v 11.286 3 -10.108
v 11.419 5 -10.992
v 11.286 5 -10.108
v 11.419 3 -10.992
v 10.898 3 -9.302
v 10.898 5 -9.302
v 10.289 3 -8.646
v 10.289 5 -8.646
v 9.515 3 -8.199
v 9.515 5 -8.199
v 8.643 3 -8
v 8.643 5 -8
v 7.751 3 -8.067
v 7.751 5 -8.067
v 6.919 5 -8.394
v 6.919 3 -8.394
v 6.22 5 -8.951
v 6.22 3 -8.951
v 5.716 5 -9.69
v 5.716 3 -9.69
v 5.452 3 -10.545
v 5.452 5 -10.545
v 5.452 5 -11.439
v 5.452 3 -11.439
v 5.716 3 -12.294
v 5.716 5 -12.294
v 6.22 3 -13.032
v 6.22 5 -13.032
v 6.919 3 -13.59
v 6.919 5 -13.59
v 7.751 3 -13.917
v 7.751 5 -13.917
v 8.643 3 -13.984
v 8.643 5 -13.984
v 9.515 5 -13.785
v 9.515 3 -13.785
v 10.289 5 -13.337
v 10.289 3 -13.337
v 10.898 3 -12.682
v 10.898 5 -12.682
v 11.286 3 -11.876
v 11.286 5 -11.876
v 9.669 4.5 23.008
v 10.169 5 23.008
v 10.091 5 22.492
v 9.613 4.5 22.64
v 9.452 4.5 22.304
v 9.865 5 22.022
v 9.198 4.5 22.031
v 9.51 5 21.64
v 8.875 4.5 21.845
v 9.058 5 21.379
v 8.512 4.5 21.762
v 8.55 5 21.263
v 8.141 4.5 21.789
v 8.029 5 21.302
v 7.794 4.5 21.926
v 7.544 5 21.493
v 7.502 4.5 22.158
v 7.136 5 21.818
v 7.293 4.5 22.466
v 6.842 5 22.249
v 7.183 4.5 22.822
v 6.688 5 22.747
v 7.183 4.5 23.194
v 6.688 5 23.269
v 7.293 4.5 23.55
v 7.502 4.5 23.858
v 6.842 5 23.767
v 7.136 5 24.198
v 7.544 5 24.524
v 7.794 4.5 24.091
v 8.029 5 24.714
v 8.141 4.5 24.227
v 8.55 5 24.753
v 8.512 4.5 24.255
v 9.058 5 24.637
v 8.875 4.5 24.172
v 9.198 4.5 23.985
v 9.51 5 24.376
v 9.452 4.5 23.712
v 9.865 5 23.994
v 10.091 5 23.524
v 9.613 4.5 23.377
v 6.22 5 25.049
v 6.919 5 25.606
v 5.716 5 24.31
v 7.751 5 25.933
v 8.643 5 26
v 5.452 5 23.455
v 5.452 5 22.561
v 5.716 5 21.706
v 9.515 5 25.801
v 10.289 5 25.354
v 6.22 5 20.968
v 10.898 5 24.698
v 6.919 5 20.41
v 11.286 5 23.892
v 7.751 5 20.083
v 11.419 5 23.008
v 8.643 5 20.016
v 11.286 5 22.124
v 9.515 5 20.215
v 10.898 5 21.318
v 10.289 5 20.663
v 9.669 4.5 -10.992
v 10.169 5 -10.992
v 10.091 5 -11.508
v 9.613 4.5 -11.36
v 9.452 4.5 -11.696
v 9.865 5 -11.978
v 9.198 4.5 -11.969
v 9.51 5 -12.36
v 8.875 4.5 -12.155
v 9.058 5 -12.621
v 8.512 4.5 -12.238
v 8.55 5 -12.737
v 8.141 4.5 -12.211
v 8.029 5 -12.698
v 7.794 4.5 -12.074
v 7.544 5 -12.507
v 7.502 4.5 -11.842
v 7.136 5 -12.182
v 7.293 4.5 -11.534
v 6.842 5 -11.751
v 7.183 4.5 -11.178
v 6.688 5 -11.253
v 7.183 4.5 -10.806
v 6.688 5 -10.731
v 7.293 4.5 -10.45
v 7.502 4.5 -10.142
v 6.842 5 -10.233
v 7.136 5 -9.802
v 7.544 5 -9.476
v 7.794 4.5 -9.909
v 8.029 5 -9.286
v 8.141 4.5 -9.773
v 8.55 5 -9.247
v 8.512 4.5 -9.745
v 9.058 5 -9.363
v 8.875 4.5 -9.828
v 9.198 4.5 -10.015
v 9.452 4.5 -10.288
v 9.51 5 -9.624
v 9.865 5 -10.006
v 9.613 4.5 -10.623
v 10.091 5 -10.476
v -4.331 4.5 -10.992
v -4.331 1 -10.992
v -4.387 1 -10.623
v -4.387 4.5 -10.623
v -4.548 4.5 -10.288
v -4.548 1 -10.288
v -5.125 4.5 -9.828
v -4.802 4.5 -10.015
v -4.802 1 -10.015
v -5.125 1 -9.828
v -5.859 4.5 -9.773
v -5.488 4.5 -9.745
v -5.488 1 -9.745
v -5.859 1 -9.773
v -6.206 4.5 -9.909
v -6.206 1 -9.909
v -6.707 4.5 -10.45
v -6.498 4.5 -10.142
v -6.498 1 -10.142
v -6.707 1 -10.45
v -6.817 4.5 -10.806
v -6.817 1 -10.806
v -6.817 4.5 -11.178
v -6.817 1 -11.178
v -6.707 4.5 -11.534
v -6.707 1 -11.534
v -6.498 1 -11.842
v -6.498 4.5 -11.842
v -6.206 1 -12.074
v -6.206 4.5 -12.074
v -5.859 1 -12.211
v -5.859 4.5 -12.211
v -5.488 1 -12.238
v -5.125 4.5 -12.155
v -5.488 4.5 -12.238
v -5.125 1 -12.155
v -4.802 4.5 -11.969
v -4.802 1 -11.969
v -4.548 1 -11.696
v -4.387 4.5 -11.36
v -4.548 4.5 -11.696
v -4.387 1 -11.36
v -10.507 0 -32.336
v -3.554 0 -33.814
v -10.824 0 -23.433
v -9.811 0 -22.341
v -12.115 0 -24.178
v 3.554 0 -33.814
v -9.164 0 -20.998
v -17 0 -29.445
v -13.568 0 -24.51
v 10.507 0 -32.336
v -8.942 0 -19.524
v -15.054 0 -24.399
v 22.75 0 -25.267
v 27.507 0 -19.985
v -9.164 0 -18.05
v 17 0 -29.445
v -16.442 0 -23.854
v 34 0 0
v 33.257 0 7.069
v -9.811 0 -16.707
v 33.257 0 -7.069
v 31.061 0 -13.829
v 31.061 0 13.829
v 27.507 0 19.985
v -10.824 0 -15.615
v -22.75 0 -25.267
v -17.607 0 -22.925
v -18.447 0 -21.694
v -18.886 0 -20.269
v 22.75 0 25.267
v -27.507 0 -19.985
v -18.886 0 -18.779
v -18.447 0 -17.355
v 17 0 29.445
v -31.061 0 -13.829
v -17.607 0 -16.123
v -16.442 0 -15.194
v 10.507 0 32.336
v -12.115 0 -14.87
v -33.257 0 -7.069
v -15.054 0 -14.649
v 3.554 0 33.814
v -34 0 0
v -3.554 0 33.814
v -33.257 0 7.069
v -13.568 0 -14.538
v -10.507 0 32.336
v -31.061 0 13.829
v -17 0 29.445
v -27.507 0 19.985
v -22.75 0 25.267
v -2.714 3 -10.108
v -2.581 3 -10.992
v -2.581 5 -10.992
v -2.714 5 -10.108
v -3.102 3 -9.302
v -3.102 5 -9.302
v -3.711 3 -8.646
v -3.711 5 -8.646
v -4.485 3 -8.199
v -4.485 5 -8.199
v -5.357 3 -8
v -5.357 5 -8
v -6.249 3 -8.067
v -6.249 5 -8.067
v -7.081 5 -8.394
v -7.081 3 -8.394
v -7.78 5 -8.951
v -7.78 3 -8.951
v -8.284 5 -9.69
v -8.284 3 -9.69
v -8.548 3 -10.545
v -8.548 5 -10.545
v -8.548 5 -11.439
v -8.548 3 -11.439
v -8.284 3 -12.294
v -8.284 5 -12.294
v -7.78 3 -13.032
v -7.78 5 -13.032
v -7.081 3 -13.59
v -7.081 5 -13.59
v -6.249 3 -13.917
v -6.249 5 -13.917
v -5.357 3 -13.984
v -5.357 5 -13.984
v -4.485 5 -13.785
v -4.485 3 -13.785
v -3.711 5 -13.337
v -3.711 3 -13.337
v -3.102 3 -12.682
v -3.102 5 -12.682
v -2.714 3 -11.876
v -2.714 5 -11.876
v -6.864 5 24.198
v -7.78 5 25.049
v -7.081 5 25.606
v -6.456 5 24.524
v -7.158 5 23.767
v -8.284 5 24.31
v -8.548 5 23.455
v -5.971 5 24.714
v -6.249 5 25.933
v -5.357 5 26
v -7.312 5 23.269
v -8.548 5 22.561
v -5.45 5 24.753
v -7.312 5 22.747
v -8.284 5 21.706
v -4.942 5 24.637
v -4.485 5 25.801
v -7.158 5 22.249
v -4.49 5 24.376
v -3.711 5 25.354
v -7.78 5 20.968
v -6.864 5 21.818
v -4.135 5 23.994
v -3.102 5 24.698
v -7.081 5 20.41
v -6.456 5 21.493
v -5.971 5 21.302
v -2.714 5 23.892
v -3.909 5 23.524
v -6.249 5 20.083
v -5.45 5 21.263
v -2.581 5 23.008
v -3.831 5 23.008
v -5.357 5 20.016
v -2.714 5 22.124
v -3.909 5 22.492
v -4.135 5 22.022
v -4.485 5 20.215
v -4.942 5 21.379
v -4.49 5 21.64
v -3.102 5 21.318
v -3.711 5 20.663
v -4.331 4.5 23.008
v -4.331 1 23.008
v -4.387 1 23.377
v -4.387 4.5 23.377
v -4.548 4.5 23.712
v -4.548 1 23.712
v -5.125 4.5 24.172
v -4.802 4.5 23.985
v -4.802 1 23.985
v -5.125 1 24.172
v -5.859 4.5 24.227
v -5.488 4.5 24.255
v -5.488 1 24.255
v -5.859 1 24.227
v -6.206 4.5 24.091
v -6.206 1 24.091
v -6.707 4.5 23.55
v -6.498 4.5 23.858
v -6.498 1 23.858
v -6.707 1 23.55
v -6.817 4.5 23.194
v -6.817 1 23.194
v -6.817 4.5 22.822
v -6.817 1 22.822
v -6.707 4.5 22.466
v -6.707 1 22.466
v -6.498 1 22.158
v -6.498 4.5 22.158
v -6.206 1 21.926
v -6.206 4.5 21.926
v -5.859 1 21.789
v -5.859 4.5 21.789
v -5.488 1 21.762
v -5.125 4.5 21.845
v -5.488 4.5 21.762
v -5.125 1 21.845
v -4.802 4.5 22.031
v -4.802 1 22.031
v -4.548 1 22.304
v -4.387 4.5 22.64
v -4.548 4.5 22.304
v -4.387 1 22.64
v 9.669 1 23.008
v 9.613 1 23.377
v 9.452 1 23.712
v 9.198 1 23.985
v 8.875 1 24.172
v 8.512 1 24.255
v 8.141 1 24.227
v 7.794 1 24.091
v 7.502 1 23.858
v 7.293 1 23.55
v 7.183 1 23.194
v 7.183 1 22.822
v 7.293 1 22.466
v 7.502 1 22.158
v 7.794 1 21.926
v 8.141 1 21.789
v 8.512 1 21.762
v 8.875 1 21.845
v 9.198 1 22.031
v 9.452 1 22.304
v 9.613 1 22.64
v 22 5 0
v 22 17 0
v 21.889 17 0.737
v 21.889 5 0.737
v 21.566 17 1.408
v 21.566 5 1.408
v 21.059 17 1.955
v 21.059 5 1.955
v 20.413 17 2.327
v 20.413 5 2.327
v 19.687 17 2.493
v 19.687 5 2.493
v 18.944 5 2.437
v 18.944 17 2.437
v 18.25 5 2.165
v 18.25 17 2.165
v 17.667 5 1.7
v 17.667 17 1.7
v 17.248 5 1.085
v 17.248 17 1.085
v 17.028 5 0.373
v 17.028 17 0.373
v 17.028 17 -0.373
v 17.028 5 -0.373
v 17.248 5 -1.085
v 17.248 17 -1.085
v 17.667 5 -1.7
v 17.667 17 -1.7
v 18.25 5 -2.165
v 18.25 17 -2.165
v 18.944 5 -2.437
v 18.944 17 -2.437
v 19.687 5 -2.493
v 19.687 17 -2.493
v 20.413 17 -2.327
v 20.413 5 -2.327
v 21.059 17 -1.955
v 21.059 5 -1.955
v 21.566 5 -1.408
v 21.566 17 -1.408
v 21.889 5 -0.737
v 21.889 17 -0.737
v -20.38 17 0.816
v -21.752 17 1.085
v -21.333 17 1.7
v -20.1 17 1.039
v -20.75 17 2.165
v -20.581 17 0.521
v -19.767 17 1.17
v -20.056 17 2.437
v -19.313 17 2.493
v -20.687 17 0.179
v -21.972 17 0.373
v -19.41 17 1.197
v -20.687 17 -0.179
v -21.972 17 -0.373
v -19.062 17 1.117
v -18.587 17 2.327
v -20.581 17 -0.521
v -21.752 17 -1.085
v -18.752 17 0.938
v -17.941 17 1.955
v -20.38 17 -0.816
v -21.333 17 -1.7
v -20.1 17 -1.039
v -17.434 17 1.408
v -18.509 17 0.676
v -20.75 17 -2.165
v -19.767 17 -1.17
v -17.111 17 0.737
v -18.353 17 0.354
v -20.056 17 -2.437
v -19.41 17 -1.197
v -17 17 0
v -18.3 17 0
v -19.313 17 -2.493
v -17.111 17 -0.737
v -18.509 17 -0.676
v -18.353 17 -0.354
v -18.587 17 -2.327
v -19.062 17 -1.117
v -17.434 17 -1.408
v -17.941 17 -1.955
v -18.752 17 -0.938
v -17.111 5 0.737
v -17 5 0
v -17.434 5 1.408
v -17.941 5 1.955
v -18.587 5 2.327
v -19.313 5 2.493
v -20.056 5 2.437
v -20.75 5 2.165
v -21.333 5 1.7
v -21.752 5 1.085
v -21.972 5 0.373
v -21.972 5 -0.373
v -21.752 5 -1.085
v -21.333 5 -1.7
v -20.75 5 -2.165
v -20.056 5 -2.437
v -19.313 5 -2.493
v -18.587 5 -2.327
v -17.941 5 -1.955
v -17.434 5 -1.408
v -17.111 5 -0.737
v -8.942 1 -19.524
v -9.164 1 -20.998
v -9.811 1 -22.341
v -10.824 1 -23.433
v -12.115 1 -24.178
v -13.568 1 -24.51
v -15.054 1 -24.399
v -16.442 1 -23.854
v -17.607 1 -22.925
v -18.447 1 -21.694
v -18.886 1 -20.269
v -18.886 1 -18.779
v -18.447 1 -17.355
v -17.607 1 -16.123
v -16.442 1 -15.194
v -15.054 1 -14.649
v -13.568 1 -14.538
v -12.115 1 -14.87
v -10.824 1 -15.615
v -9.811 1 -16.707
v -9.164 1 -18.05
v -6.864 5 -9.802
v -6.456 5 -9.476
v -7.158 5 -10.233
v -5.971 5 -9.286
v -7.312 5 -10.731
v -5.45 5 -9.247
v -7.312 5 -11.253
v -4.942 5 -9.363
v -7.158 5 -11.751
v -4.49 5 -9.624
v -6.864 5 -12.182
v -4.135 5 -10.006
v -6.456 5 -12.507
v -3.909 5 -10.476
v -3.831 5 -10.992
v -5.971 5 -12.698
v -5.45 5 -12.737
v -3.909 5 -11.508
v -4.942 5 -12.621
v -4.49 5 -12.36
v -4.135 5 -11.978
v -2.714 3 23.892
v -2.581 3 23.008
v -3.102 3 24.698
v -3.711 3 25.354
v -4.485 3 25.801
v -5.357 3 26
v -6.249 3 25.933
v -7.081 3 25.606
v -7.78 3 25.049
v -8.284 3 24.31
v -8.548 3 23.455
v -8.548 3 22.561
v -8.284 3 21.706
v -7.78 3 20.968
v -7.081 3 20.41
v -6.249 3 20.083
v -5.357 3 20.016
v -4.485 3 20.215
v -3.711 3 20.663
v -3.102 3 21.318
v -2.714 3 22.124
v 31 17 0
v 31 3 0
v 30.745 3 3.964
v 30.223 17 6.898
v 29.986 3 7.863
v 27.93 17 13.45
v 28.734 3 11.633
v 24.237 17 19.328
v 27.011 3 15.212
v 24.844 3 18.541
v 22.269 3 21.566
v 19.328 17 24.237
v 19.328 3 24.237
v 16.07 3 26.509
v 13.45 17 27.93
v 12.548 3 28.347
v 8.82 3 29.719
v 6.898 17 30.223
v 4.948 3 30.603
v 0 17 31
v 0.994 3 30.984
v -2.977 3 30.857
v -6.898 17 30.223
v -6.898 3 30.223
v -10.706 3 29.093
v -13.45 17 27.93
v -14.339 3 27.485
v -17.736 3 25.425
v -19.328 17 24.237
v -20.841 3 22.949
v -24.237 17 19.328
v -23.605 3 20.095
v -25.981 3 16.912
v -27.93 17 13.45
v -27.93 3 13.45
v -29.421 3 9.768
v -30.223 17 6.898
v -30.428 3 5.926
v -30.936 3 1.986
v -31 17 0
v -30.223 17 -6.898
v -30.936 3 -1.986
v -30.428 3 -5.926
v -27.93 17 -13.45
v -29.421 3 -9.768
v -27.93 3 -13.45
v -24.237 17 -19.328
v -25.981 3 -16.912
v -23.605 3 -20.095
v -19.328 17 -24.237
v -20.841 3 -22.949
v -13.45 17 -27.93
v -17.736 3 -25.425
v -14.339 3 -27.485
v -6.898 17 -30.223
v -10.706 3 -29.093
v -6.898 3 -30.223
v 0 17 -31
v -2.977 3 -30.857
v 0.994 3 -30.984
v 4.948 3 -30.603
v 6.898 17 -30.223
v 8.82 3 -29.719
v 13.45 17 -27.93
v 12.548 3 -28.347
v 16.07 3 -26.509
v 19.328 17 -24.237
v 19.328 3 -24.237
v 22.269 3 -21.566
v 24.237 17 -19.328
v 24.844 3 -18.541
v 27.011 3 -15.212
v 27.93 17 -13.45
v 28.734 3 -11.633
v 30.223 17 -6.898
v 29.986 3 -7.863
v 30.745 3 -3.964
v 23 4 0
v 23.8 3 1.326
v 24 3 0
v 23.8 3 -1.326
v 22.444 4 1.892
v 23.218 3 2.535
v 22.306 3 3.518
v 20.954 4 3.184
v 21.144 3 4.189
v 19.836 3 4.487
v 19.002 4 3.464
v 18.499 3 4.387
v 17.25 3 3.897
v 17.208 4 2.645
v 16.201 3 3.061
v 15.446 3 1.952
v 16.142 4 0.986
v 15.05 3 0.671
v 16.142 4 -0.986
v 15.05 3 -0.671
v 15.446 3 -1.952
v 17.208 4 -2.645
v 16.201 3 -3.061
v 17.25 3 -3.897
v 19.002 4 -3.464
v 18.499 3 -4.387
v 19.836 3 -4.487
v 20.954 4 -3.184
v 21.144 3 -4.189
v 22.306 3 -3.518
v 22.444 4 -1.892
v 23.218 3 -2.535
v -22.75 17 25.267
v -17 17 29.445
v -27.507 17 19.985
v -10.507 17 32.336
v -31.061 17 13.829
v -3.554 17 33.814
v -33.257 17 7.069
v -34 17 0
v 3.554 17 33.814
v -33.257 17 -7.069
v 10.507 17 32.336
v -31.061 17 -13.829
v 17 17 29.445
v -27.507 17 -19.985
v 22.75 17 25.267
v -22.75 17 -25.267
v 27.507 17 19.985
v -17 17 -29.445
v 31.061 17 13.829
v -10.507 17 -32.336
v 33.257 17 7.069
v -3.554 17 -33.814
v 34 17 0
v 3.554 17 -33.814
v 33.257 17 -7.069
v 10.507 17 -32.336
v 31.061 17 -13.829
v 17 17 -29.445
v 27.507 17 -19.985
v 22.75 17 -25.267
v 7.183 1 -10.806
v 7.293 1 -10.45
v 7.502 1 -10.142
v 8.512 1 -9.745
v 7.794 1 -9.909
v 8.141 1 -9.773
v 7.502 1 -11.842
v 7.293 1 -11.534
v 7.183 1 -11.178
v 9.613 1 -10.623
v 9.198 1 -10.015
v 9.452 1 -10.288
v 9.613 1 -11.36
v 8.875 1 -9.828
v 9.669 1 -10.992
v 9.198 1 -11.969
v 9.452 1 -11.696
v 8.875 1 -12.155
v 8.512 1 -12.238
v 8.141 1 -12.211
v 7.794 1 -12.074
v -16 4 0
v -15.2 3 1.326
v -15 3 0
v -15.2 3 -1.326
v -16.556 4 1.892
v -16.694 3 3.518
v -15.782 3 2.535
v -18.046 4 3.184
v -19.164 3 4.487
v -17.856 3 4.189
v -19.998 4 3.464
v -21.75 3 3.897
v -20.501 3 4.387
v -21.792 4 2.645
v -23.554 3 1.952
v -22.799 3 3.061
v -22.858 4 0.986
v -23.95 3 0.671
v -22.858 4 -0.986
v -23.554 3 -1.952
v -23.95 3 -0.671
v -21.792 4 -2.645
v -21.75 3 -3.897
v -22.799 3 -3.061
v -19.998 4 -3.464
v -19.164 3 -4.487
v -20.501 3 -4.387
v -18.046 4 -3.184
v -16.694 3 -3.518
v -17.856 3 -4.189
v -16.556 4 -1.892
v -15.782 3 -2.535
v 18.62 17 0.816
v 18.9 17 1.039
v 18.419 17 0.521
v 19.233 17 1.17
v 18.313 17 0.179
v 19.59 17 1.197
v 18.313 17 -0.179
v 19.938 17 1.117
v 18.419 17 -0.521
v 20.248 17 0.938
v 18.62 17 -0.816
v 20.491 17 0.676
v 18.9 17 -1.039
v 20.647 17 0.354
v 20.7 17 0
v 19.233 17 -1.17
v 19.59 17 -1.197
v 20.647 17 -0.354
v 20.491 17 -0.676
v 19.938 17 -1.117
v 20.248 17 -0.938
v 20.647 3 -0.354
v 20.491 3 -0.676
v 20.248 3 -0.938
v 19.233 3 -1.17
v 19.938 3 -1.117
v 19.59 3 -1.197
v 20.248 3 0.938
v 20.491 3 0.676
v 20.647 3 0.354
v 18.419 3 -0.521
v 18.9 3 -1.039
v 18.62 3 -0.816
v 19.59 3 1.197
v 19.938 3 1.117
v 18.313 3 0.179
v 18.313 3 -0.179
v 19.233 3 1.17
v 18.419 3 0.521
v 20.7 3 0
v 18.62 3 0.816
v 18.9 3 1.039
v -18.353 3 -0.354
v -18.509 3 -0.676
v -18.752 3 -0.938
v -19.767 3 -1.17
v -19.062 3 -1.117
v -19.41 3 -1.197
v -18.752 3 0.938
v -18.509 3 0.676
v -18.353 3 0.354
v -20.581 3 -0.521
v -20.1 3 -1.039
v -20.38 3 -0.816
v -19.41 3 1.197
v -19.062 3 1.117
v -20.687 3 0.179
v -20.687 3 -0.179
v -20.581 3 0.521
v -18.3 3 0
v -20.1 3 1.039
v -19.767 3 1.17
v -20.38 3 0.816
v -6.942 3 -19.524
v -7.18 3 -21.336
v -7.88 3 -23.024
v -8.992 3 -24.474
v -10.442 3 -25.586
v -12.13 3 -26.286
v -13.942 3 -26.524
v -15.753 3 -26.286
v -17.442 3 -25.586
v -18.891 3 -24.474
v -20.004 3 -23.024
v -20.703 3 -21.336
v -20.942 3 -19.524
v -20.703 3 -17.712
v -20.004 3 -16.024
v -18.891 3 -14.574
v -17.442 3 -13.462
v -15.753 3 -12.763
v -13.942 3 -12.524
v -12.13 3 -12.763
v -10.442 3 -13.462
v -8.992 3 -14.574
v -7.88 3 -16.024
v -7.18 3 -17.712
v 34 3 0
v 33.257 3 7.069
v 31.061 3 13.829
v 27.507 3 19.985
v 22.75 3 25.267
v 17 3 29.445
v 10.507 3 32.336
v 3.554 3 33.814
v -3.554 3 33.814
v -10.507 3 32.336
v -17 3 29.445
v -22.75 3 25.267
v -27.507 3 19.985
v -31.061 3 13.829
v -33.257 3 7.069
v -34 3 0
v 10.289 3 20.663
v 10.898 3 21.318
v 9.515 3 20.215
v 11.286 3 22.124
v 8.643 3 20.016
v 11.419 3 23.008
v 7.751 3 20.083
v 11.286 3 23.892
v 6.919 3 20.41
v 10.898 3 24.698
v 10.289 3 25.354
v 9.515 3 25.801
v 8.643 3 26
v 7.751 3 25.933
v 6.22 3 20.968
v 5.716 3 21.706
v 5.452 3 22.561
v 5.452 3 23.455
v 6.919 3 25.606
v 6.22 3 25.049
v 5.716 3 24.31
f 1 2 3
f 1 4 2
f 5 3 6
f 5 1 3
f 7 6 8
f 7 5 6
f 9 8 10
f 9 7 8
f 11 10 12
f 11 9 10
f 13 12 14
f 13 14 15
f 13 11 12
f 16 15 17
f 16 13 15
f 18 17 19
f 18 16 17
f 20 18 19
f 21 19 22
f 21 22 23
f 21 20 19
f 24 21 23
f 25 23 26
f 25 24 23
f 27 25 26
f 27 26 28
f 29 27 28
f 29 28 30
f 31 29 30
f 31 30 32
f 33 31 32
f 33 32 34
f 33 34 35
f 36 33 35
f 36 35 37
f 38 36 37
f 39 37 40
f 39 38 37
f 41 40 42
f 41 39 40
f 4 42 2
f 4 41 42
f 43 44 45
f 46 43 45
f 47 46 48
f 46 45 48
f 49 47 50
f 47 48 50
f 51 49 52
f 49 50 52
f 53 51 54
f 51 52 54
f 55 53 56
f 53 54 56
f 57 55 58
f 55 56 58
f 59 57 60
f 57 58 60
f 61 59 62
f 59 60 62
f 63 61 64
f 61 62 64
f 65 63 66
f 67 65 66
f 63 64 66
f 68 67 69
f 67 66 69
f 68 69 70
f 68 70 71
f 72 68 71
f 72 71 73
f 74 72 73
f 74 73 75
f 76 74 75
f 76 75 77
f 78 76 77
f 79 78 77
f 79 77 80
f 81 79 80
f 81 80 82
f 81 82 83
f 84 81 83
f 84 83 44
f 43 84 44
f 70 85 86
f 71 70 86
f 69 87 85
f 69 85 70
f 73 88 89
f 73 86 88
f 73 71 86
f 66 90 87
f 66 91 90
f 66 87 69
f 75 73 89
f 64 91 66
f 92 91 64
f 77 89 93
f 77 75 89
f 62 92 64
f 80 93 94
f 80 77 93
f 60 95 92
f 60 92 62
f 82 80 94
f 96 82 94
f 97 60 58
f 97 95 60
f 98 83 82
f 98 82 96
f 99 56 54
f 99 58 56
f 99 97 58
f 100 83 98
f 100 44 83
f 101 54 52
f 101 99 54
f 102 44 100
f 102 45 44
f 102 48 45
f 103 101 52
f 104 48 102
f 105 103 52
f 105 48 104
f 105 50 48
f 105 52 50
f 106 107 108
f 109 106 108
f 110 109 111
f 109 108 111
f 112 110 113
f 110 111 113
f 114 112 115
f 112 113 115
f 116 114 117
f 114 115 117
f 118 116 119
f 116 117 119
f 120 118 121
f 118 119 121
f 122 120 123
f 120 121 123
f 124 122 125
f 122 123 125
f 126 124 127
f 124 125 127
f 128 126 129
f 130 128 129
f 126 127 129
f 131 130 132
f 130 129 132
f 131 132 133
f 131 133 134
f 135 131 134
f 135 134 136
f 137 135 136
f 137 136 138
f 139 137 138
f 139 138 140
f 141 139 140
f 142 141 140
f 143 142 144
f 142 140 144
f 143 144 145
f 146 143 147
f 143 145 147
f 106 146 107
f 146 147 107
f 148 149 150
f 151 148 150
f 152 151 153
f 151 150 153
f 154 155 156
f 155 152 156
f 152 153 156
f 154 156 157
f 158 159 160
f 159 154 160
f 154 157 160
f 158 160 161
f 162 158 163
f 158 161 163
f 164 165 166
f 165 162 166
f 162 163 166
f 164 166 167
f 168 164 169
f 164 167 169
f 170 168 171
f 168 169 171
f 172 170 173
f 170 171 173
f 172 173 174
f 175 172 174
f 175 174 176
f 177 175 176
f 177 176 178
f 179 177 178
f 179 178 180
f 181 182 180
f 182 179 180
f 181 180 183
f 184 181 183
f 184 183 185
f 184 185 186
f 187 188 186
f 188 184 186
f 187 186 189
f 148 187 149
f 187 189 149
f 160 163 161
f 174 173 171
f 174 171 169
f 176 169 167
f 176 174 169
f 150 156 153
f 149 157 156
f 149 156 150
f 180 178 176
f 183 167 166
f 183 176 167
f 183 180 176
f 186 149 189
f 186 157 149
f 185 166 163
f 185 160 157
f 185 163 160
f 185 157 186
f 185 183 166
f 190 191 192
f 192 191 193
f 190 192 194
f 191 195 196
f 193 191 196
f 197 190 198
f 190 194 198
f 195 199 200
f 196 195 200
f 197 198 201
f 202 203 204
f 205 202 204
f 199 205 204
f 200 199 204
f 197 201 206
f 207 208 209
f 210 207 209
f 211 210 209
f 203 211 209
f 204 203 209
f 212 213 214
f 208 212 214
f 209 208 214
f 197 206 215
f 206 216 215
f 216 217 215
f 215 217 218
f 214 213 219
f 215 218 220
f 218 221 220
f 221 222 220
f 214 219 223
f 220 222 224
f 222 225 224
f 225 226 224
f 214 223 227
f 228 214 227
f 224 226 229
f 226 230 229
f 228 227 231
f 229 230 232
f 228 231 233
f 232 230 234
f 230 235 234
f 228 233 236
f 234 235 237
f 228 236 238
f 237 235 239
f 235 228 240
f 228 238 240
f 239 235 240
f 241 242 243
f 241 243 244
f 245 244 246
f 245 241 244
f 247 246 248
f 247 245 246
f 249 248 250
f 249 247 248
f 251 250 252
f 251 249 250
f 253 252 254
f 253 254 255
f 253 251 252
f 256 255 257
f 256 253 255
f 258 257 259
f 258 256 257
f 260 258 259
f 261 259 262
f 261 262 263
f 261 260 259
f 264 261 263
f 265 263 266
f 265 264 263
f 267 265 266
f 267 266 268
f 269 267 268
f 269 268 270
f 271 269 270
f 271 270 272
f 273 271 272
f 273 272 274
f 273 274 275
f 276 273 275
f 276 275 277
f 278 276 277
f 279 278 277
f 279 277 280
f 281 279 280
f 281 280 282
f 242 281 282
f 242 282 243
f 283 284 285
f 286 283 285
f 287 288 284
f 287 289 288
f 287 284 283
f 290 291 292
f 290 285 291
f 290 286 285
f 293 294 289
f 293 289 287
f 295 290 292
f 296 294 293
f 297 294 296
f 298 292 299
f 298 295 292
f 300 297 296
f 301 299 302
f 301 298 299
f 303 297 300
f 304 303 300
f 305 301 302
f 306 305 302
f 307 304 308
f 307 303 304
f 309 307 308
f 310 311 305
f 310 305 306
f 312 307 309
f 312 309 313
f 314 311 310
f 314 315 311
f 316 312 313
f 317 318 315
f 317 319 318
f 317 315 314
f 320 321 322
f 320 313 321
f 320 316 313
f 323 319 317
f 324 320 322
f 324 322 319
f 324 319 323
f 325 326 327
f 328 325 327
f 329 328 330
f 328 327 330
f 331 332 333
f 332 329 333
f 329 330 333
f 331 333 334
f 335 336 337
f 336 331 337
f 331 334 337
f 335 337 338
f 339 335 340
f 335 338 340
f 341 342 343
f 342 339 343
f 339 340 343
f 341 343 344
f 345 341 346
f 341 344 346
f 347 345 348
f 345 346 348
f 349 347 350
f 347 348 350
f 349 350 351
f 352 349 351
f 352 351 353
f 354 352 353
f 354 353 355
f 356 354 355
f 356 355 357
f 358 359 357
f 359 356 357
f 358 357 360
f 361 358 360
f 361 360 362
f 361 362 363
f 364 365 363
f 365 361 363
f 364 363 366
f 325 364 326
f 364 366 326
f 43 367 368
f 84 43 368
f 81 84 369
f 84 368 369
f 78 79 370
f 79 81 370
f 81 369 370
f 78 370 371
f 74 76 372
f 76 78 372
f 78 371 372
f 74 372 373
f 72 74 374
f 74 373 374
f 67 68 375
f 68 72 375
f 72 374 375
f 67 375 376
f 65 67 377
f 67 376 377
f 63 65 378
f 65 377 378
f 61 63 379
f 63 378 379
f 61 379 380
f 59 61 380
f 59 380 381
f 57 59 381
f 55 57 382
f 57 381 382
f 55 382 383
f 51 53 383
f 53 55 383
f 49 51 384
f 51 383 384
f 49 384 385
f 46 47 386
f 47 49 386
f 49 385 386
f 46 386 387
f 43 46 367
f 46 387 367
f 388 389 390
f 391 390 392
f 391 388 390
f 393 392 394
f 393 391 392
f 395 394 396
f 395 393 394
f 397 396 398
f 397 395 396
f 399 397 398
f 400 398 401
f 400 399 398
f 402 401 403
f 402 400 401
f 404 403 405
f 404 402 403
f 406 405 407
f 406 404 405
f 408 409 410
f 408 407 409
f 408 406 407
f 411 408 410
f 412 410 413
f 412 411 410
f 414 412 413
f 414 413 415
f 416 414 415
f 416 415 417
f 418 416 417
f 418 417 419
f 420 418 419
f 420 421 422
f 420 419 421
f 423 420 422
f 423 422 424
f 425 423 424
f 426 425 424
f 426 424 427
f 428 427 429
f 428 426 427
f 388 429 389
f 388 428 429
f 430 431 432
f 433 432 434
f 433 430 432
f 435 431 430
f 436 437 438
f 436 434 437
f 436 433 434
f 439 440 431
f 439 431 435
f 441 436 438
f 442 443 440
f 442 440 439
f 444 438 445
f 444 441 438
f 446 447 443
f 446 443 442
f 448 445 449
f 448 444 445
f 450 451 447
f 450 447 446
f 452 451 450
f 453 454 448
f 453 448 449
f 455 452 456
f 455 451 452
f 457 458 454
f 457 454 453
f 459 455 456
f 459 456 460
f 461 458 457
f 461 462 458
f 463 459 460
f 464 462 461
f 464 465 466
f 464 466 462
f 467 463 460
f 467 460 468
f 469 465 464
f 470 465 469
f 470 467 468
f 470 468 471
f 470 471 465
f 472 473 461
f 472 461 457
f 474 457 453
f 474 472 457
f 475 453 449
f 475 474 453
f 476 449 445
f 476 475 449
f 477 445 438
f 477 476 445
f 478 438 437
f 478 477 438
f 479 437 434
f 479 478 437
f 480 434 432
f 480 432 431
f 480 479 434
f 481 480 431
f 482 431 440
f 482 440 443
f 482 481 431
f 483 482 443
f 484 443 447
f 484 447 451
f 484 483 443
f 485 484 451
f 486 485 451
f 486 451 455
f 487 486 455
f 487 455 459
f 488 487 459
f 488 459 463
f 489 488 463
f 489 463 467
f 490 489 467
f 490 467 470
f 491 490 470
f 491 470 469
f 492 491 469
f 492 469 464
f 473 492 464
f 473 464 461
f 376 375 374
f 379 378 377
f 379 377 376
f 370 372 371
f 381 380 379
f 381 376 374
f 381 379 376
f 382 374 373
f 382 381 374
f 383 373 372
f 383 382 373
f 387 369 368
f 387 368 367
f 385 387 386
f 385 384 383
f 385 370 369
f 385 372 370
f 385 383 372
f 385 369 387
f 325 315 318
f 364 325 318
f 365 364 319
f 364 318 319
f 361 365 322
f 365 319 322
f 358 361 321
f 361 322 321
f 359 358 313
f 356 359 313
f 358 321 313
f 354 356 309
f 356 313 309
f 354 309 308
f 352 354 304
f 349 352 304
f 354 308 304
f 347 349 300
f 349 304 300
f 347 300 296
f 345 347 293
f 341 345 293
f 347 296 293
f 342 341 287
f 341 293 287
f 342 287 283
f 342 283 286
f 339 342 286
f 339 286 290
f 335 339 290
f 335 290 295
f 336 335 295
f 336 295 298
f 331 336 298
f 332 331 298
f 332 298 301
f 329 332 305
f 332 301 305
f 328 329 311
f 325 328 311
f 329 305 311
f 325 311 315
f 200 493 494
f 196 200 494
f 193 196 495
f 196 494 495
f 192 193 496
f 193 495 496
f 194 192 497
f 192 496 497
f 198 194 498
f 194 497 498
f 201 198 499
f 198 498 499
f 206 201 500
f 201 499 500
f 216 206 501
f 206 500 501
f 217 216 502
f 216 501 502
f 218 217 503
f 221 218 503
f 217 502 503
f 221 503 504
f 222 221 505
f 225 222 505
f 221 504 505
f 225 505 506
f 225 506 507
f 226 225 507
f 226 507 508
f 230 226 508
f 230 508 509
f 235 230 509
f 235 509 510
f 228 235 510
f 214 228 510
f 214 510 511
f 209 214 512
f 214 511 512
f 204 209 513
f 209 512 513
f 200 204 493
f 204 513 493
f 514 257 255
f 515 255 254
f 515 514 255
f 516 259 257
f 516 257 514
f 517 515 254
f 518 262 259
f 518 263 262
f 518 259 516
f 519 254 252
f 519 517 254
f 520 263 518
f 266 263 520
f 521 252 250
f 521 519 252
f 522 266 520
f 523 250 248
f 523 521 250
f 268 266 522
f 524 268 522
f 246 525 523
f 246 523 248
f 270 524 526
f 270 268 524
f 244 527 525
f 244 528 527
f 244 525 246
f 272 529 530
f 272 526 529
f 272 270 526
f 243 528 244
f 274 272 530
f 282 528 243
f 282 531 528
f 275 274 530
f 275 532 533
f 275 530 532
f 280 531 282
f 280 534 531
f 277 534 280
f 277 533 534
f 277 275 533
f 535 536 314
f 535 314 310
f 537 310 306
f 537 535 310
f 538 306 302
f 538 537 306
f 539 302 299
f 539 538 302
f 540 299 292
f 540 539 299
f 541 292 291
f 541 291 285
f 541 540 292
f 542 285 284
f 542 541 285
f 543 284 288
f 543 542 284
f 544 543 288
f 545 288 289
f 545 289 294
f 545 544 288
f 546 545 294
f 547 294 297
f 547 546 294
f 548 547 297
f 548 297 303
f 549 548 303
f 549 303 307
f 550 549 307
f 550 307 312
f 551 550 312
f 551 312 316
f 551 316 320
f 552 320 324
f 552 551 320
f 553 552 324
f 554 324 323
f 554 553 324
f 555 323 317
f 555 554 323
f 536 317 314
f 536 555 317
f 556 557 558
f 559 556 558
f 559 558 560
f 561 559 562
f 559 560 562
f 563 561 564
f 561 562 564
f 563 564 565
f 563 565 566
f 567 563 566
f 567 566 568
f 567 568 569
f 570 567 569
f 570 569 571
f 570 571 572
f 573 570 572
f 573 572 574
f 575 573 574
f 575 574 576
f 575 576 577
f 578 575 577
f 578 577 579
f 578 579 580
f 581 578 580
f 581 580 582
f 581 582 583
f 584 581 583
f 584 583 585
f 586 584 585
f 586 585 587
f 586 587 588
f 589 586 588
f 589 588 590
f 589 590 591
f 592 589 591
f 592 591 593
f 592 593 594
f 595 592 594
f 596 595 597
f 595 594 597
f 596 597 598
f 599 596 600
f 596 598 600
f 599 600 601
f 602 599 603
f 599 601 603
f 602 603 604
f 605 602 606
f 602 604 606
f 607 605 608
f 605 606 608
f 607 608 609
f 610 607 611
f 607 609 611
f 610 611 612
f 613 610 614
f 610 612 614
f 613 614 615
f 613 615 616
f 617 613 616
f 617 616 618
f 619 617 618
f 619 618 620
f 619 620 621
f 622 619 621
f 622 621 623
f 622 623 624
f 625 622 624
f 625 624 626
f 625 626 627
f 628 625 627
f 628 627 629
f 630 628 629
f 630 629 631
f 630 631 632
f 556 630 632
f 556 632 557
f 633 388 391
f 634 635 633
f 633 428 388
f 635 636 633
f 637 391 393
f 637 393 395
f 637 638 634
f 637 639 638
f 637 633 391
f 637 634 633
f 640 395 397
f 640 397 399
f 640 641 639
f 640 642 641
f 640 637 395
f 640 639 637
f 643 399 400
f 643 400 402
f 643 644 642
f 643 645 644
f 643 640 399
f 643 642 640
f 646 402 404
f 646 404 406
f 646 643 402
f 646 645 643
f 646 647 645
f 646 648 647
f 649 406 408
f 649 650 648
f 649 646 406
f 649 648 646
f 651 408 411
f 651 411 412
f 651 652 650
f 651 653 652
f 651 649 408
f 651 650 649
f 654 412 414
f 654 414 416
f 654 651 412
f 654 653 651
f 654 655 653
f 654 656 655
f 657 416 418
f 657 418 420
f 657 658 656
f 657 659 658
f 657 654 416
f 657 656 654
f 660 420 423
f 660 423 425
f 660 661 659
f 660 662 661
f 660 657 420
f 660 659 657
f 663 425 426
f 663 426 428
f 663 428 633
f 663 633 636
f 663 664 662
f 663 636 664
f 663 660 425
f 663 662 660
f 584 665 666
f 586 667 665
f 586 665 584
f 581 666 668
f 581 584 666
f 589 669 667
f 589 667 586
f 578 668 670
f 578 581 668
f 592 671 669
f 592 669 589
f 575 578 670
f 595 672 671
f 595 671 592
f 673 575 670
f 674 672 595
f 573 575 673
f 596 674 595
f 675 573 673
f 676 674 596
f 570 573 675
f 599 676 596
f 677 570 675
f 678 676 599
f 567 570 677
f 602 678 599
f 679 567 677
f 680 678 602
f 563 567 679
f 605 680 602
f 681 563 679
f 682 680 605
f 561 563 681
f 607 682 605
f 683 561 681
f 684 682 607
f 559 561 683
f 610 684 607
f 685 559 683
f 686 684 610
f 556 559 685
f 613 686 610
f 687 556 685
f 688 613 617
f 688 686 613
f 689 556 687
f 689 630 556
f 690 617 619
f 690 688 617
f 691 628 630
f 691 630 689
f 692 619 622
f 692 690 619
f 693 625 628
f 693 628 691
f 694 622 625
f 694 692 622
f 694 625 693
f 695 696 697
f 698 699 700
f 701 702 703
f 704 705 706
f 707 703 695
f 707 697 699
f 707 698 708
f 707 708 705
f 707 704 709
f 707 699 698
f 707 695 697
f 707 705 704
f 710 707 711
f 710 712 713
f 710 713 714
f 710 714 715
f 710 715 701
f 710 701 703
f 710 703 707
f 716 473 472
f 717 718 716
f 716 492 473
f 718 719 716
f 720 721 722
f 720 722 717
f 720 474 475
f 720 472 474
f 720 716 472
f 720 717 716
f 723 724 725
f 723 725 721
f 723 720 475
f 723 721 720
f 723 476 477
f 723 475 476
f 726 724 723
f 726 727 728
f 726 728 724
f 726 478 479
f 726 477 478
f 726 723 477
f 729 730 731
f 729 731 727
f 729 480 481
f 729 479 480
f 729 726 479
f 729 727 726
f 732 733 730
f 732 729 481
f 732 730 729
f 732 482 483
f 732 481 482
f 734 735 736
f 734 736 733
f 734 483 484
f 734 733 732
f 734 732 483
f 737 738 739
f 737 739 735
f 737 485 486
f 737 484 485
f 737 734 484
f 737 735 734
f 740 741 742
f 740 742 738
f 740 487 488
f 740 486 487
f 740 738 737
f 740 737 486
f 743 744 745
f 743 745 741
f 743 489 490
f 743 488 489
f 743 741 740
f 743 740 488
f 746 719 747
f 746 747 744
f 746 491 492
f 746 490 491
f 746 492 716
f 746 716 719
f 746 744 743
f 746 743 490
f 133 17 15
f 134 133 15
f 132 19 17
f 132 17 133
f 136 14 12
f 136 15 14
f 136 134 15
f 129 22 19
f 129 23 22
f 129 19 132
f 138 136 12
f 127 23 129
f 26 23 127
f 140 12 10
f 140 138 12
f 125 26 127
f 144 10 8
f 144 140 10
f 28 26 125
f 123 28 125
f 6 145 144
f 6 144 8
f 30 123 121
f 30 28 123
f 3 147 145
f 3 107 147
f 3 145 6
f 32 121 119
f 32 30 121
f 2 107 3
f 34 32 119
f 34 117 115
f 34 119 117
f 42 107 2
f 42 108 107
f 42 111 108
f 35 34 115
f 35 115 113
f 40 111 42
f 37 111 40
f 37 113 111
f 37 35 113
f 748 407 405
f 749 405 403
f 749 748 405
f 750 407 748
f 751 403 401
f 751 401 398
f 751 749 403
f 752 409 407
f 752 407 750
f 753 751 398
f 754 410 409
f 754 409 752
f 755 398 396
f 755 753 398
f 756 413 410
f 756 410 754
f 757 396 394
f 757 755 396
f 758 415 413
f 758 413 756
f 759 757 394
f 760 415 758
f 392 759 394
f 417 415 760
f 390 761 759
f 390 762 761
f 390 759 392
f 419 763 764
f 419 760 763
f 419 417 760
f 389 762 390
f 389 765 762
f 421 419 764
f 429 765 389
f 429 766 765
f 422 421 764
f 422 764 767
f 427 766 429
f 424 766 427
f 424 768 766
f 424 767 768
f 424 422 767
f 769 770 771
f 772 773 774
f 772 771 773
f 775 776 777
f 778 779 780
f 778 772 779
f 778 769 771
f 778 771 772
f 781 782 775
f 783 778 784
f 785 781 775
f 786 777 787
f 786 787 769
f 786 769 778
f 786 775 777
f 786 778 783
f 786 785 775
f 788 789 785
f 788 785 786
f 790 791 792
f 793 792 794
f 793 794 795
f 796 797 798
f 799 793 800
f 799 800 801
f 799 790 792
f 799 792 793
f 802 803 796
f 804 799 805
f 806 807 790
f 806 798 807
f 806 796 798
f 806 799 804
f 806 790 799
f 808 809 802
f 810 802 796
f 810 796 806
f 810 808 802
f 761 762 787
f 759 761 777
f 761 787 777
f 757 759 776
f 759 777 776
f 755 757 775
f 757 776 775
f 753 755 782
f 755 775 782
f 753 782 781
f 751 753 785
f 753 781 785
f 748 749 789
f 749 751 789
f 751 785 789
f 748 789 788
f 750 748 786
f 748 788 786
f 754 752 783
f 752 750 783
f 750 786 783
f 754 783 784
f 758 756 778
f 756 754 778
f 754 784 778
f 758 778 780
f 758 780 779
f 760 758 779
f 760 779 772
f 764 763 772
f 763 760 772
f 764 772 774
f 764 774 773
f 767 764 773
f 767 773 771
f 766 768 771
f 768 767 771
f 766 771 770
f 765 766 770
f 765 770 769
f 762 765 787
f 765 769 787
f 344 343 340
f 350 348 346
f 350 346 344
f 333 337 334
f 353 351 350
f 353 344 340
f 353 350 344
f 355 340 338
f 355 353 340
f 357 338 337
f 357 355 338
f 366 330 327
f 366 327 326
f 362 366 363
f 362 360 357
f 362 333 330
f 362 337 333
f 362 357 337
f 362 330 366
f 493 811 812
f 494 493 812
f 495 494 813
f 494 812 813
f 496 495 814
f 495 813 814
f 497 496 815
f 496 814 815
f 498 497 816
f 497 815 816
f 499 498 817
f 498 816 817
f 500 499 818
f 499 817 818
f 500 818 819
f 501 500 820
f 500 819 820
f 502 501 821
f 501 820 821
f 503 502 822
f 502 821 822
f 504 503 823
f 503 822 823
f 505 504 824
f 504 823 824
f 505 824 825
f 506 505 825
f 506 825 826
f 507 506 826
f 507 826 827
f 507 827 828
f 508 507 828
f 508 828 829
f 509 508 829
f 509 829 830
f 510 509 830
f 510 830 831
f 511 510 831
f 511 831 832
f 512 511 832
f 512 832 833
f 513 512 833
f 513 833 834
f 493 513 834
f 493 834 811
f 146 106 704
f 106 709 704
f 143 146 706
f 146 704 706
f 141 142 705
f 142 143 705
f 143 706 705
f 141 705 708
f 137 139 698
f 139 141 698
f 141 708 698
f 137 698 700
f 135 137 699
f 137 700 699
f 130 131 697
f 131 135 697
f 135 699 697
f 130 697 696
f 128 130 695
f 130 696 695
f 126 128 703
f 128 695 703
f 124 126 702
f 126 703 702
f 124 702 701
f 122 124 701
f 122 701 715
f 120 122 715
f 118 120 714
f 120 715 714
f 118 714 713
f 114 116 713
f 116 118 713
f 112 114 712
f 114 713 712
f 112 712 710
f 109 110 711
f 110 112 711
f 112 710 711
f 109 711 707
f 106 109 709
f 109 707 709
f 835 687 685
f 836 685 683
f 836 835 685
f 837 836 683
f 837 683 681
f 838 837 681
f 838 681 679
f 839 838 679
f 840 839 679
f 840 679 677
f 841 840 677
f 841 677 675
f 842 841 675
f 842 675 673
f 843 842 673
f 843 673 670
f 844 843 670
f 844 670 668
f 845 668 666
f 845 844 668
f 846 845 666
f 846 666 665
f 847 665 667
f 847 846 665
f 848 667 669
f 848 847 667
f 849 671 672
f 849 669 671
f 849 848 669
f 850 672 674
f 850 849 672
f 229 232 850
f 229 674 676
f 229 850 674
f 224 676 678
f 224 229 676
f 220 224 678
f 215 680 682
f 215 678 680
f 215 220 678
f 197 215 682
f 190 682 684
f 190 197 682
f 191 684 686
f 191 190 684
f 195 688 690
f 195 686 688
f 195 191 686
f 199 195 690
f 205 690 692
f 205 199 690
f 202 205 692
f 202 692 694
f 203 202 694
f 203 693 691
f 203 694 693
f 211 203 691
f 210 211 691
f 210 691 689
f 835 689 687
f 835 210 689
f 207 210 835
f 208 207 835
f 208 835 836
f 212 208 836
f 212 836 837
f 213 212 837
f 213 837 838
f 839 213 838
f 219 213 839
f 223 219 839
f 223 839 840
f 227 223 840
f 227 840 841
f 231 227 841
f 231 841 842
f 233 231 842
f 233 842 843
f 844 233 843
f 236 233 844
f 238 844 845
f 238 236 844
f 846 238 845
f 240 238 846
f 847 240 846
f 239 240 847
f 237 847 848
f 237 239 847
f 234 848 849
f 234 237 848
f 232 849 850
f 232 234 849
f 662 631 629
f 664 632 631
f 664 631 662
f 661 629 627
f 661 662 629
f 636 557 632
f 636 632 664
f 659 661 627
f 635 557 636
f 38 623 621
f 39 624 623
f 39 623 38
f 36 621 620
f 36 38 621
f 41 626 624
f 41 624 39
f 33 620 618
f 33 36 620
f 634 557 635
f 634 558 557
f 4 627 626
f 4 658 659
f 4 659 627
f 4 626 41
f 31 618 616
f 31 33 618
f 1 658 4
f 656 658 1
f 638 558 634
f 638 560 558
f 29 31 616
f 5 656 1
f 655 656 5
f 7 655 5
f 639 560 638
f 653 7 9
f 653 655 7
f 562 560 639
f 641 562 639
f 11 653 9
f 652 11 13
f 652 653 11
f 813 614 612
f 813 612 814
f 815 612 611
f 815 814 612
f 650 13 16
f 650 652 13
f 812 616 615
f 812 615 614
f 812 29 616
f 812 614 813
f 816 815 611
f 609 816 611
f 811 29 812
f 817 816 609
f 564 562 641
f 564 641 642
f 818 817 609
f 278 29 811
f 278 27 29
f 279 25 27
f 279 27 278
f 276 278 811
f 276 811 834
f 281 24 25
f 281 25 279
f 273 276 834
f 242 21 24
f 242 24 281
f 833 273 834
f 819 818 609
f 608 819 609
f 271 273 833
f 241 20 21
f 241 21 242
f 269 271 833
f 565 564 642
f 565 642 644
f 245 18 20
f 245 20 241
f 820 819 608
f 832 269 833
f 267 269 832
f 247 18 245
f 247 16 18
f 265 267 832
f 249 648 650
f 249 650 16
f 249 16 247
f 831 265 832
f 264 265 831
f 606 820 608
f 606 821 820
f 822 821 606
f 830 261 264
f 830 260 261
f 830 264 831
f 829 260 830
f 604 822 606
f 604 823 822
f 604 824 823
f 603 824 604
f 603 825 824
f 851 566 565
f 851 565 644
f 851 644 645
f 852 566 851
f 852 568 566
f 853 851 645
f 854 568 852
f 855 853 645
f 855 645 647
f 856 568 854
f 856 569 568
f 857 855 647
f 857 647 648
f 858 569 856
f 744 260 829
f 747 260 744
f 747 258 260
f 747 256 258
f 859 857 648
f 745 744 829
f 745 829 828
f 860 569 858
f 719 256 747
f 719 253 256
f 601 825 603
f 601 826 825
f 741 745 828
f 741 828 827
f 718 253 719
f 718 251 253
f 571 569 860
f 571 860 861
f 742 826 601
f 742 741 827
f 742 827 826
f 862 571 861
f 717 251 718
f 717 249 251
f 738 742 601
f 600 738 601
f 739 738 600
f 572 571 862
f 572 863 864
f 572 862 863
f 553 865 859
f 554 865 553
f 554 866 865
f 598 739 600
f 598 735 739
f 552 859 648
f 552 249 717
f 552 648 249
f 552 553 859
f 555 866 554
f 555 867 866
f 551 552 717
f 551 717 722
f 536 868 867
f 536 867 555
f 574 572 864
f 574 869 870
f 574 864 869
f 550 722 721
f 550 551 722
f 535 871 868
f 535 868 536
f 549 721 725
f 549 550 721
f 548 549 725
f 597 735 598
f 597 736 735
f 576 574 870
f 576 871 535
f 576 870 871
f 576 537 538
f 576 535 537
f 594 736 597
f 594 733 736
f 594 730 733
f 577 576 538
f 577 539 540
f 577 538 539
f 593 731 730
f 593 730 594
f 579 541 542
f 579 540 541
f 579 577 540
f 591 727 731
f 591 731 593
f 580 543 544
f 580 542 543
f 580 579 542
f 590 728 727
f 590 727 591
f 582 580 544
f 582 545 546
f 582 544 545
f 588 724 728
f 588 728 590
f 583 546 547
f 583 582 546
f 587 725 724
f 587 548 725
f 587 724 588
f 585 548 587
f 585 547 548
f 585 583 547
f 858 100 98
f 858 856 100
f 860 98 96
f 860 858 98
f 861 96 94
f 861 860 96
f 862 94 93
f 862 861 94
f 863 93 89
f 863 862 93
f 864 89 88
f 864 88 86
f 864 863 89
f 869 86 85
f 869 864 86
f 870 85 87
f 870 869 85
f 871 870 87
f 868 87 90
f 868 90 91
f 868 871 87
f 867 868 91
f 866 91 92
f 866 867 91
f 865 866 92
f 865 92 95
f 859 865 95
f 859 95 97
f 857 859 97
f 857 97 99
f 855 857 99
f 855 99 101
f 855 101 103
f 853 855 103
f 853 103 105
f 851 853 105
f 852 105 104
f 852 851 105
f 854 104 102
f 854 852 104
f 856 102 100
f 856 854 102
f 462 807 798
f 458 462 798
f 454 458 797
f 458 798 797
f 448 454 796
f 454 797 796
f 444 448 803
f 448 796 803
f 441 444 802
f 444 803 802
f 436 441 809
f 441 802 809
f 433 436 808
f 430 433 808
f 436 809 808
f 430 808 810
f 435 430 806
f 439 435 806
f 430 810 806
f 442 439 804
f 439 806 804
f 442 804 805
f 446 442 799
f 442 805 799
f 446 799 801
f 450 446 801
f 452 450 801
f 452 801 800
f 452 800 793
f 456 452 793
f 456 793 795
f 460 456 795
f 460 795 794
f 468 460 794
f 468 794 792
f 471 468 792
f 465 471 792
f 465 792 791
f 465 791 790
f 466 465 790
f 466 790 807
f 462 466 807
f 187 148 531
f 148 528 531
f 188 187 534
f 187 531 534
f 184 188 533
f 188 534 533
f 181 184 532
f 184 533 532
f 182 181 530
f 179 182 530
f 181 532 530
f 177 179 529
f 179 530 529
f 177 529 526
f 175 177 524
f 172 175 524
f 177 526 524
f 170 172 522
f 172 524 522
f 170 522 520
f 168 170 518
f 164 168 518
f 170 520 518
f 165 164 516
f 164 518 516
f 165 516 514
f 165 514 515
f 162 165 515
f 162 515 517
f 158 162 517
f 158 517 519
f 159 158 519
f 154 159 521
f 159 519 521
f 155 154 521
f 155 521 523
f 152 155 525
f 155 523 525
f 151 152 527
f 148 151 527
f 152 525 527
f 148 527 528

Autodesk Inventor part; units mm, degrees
ref_plane "YZ Plane" through (0, 0, 0) normal (1, 0, 0) x (0, 1, 0)
ref_plane "XZ Plane" through (0, 0, 0) normal (0, 1, 0) x (-1, 0, 0)
ref_plane "XY Plane" through (0, 0, 0) normal (0, 0, 1) x (1, 0, 0)
sketch "Sketch1" plane through (0, 0, 0) normal (0, 1, 0) x (-1, 0, 0)
  circle A0 centre (0, 0) radius 34
  dimension "d0" = 68
extrude "Extrusion1" add sketch "Sketch1" along normal blind 3
sketch "Sketch2" plane through (0, 3, 0) normal (0, 1, 0) x (1, 0, 0)
  circle A0 centre (0, 0) radius 34 projected
  circle A1 centre (0, 0) radius 31
  dimension "d3" = 62
extrude "Extrusion2" add sketch "Sketch2" along normal blind 14
sketch "Sketch3" plane through (0, 3, 0) normal (0, 1, 0) x (1, 0, 0)
  circle A0 centre (0, 0) radius 31 projected
  circle A1 centre (0, 0) radius 19.5
  line L0 (-19.5, 0) -> (19.5, 0)
  circle A2 centre (-19.5, 0) radius 1.2
  circle A3 centre (-19.5, 0) radius 2.5
  circle A4 centre (19.5, 0) radius 1.2
  circle A5 centre (19.5, 0) radius 2.5
  dimension "d6" = 39
  dimension "d7" = 2.4
  dimension "d8" = 5
  dimension "d9" = 2.4
  dimension "d10" = 5
extrude "Extrusion3" add sketch "Sketch3" along normal up to surface (14 mm away) contours A4 L0 A5 A1 | A1 A5 A4 | A1 A5 L0 A4 | A3 L0 A2 A1 | A1 A2 A3 | A1 A2 L0 A3
chamfer "Chamfer1" distance 2 angle 45 2 edges at (-22, 3, 0) (17, 3, 0)
sketch "Sketch4" plane through (0, 3, 0) normal (0, 1, 0) x (1, 0, 0)
  circle A0 centre (-13.9417, 19.5241) radius 5
  dimension "d16" = 10
extrude "Extrusion4" cut sketch "Sketch4" against normal blind 14
chamfer "Chamfer2" distance 2 angle 45 1 edges at (-18.9417, 3, -19.5241)
sketch "Sketch5" plane through (0, 3, 0) normal (0, 1, 0) x (1, 0, 0)
  line L0 (-8.5812, 13.9919) -> (11.4188, 13.9919)
  line L1 (11.4188, 13.9919) -> (11.4188, -26.0081)
  line L2 (11.4188, -26.0081) -> (-8.5812, -26.0081)
  line L3 (-8.5812, -26.0081) -> (-8.5812, 13.9919)
  circle A0 centre (-5.5812, 10.9919) radius 1.25
  circle A1 centre (-5.5812, 10.9919) radius 3
  circle A2 centre (8.4188, 10.9919) radius 1.25
  circle A3 centre (8.4188, 10.9919) radius 3
  circle A4 centre (8.4188, -23.0081) radius 1.25
  circle A5 centre (8.4188, -23.0081) radius 3
  circle A6 centre (-5.5812, -23.0081) radius 1.25
  circle A7 centre (-5.5812, -23.0081) radius 3
  dimension "d22" = 20
  dimension "d23" = 40
  dimension "d24" = 2.5
  dimension "d25" = 6
  dimension "d26" = 2.5
  dimension "d27" = 6
  dimension "d28" = 2.5
  dimension "d29" = 6
  dimension "d30" = 2.5
  dimension "d31" = 6
  dimension "d32" = 3
  dimension "d33" = 3
  dimension "d34" = 3
  dimension "d35" = 3
  dimension "d36" = 3
  dimension "d37" = 3
  dimension "d38" = 3
  dimension "d39" = 3
extrude "Extrusion5" add sketch "Sketch5" along normal blind 2 contours A1 | A3 | A7 | A5
sketch "Sketch6" plane through (-5.5812, 3, -10.9919) normal (0, 1, 0) x (1, 0, 0)
  circle A0 centre (0, 0) radius 1.25 projected
  circle A1 centre (0, 0) radius 1.25 projected
  circle A2 centre (14, 0) radius 1.25 projected
  circle A3 centre (14, -34) radius 1.25 projected
  circle A4 centre (0, -34) radius 1.25 projected
  point P0 (5.5812, -10.9919)
extrude "Extrusion6" cut sketch "Sketch6" against normal blind 2
chamfer "Chamfer3" distance 0.5 angle 45 4 edges at (-6.8312, 5, -10.9919) (7.1688, 5, -10.9919) (-6.8312, 5, 23.0081) (7.1688, 5, 23.0081)
properties part number "obudowa - czujnik dymu"
